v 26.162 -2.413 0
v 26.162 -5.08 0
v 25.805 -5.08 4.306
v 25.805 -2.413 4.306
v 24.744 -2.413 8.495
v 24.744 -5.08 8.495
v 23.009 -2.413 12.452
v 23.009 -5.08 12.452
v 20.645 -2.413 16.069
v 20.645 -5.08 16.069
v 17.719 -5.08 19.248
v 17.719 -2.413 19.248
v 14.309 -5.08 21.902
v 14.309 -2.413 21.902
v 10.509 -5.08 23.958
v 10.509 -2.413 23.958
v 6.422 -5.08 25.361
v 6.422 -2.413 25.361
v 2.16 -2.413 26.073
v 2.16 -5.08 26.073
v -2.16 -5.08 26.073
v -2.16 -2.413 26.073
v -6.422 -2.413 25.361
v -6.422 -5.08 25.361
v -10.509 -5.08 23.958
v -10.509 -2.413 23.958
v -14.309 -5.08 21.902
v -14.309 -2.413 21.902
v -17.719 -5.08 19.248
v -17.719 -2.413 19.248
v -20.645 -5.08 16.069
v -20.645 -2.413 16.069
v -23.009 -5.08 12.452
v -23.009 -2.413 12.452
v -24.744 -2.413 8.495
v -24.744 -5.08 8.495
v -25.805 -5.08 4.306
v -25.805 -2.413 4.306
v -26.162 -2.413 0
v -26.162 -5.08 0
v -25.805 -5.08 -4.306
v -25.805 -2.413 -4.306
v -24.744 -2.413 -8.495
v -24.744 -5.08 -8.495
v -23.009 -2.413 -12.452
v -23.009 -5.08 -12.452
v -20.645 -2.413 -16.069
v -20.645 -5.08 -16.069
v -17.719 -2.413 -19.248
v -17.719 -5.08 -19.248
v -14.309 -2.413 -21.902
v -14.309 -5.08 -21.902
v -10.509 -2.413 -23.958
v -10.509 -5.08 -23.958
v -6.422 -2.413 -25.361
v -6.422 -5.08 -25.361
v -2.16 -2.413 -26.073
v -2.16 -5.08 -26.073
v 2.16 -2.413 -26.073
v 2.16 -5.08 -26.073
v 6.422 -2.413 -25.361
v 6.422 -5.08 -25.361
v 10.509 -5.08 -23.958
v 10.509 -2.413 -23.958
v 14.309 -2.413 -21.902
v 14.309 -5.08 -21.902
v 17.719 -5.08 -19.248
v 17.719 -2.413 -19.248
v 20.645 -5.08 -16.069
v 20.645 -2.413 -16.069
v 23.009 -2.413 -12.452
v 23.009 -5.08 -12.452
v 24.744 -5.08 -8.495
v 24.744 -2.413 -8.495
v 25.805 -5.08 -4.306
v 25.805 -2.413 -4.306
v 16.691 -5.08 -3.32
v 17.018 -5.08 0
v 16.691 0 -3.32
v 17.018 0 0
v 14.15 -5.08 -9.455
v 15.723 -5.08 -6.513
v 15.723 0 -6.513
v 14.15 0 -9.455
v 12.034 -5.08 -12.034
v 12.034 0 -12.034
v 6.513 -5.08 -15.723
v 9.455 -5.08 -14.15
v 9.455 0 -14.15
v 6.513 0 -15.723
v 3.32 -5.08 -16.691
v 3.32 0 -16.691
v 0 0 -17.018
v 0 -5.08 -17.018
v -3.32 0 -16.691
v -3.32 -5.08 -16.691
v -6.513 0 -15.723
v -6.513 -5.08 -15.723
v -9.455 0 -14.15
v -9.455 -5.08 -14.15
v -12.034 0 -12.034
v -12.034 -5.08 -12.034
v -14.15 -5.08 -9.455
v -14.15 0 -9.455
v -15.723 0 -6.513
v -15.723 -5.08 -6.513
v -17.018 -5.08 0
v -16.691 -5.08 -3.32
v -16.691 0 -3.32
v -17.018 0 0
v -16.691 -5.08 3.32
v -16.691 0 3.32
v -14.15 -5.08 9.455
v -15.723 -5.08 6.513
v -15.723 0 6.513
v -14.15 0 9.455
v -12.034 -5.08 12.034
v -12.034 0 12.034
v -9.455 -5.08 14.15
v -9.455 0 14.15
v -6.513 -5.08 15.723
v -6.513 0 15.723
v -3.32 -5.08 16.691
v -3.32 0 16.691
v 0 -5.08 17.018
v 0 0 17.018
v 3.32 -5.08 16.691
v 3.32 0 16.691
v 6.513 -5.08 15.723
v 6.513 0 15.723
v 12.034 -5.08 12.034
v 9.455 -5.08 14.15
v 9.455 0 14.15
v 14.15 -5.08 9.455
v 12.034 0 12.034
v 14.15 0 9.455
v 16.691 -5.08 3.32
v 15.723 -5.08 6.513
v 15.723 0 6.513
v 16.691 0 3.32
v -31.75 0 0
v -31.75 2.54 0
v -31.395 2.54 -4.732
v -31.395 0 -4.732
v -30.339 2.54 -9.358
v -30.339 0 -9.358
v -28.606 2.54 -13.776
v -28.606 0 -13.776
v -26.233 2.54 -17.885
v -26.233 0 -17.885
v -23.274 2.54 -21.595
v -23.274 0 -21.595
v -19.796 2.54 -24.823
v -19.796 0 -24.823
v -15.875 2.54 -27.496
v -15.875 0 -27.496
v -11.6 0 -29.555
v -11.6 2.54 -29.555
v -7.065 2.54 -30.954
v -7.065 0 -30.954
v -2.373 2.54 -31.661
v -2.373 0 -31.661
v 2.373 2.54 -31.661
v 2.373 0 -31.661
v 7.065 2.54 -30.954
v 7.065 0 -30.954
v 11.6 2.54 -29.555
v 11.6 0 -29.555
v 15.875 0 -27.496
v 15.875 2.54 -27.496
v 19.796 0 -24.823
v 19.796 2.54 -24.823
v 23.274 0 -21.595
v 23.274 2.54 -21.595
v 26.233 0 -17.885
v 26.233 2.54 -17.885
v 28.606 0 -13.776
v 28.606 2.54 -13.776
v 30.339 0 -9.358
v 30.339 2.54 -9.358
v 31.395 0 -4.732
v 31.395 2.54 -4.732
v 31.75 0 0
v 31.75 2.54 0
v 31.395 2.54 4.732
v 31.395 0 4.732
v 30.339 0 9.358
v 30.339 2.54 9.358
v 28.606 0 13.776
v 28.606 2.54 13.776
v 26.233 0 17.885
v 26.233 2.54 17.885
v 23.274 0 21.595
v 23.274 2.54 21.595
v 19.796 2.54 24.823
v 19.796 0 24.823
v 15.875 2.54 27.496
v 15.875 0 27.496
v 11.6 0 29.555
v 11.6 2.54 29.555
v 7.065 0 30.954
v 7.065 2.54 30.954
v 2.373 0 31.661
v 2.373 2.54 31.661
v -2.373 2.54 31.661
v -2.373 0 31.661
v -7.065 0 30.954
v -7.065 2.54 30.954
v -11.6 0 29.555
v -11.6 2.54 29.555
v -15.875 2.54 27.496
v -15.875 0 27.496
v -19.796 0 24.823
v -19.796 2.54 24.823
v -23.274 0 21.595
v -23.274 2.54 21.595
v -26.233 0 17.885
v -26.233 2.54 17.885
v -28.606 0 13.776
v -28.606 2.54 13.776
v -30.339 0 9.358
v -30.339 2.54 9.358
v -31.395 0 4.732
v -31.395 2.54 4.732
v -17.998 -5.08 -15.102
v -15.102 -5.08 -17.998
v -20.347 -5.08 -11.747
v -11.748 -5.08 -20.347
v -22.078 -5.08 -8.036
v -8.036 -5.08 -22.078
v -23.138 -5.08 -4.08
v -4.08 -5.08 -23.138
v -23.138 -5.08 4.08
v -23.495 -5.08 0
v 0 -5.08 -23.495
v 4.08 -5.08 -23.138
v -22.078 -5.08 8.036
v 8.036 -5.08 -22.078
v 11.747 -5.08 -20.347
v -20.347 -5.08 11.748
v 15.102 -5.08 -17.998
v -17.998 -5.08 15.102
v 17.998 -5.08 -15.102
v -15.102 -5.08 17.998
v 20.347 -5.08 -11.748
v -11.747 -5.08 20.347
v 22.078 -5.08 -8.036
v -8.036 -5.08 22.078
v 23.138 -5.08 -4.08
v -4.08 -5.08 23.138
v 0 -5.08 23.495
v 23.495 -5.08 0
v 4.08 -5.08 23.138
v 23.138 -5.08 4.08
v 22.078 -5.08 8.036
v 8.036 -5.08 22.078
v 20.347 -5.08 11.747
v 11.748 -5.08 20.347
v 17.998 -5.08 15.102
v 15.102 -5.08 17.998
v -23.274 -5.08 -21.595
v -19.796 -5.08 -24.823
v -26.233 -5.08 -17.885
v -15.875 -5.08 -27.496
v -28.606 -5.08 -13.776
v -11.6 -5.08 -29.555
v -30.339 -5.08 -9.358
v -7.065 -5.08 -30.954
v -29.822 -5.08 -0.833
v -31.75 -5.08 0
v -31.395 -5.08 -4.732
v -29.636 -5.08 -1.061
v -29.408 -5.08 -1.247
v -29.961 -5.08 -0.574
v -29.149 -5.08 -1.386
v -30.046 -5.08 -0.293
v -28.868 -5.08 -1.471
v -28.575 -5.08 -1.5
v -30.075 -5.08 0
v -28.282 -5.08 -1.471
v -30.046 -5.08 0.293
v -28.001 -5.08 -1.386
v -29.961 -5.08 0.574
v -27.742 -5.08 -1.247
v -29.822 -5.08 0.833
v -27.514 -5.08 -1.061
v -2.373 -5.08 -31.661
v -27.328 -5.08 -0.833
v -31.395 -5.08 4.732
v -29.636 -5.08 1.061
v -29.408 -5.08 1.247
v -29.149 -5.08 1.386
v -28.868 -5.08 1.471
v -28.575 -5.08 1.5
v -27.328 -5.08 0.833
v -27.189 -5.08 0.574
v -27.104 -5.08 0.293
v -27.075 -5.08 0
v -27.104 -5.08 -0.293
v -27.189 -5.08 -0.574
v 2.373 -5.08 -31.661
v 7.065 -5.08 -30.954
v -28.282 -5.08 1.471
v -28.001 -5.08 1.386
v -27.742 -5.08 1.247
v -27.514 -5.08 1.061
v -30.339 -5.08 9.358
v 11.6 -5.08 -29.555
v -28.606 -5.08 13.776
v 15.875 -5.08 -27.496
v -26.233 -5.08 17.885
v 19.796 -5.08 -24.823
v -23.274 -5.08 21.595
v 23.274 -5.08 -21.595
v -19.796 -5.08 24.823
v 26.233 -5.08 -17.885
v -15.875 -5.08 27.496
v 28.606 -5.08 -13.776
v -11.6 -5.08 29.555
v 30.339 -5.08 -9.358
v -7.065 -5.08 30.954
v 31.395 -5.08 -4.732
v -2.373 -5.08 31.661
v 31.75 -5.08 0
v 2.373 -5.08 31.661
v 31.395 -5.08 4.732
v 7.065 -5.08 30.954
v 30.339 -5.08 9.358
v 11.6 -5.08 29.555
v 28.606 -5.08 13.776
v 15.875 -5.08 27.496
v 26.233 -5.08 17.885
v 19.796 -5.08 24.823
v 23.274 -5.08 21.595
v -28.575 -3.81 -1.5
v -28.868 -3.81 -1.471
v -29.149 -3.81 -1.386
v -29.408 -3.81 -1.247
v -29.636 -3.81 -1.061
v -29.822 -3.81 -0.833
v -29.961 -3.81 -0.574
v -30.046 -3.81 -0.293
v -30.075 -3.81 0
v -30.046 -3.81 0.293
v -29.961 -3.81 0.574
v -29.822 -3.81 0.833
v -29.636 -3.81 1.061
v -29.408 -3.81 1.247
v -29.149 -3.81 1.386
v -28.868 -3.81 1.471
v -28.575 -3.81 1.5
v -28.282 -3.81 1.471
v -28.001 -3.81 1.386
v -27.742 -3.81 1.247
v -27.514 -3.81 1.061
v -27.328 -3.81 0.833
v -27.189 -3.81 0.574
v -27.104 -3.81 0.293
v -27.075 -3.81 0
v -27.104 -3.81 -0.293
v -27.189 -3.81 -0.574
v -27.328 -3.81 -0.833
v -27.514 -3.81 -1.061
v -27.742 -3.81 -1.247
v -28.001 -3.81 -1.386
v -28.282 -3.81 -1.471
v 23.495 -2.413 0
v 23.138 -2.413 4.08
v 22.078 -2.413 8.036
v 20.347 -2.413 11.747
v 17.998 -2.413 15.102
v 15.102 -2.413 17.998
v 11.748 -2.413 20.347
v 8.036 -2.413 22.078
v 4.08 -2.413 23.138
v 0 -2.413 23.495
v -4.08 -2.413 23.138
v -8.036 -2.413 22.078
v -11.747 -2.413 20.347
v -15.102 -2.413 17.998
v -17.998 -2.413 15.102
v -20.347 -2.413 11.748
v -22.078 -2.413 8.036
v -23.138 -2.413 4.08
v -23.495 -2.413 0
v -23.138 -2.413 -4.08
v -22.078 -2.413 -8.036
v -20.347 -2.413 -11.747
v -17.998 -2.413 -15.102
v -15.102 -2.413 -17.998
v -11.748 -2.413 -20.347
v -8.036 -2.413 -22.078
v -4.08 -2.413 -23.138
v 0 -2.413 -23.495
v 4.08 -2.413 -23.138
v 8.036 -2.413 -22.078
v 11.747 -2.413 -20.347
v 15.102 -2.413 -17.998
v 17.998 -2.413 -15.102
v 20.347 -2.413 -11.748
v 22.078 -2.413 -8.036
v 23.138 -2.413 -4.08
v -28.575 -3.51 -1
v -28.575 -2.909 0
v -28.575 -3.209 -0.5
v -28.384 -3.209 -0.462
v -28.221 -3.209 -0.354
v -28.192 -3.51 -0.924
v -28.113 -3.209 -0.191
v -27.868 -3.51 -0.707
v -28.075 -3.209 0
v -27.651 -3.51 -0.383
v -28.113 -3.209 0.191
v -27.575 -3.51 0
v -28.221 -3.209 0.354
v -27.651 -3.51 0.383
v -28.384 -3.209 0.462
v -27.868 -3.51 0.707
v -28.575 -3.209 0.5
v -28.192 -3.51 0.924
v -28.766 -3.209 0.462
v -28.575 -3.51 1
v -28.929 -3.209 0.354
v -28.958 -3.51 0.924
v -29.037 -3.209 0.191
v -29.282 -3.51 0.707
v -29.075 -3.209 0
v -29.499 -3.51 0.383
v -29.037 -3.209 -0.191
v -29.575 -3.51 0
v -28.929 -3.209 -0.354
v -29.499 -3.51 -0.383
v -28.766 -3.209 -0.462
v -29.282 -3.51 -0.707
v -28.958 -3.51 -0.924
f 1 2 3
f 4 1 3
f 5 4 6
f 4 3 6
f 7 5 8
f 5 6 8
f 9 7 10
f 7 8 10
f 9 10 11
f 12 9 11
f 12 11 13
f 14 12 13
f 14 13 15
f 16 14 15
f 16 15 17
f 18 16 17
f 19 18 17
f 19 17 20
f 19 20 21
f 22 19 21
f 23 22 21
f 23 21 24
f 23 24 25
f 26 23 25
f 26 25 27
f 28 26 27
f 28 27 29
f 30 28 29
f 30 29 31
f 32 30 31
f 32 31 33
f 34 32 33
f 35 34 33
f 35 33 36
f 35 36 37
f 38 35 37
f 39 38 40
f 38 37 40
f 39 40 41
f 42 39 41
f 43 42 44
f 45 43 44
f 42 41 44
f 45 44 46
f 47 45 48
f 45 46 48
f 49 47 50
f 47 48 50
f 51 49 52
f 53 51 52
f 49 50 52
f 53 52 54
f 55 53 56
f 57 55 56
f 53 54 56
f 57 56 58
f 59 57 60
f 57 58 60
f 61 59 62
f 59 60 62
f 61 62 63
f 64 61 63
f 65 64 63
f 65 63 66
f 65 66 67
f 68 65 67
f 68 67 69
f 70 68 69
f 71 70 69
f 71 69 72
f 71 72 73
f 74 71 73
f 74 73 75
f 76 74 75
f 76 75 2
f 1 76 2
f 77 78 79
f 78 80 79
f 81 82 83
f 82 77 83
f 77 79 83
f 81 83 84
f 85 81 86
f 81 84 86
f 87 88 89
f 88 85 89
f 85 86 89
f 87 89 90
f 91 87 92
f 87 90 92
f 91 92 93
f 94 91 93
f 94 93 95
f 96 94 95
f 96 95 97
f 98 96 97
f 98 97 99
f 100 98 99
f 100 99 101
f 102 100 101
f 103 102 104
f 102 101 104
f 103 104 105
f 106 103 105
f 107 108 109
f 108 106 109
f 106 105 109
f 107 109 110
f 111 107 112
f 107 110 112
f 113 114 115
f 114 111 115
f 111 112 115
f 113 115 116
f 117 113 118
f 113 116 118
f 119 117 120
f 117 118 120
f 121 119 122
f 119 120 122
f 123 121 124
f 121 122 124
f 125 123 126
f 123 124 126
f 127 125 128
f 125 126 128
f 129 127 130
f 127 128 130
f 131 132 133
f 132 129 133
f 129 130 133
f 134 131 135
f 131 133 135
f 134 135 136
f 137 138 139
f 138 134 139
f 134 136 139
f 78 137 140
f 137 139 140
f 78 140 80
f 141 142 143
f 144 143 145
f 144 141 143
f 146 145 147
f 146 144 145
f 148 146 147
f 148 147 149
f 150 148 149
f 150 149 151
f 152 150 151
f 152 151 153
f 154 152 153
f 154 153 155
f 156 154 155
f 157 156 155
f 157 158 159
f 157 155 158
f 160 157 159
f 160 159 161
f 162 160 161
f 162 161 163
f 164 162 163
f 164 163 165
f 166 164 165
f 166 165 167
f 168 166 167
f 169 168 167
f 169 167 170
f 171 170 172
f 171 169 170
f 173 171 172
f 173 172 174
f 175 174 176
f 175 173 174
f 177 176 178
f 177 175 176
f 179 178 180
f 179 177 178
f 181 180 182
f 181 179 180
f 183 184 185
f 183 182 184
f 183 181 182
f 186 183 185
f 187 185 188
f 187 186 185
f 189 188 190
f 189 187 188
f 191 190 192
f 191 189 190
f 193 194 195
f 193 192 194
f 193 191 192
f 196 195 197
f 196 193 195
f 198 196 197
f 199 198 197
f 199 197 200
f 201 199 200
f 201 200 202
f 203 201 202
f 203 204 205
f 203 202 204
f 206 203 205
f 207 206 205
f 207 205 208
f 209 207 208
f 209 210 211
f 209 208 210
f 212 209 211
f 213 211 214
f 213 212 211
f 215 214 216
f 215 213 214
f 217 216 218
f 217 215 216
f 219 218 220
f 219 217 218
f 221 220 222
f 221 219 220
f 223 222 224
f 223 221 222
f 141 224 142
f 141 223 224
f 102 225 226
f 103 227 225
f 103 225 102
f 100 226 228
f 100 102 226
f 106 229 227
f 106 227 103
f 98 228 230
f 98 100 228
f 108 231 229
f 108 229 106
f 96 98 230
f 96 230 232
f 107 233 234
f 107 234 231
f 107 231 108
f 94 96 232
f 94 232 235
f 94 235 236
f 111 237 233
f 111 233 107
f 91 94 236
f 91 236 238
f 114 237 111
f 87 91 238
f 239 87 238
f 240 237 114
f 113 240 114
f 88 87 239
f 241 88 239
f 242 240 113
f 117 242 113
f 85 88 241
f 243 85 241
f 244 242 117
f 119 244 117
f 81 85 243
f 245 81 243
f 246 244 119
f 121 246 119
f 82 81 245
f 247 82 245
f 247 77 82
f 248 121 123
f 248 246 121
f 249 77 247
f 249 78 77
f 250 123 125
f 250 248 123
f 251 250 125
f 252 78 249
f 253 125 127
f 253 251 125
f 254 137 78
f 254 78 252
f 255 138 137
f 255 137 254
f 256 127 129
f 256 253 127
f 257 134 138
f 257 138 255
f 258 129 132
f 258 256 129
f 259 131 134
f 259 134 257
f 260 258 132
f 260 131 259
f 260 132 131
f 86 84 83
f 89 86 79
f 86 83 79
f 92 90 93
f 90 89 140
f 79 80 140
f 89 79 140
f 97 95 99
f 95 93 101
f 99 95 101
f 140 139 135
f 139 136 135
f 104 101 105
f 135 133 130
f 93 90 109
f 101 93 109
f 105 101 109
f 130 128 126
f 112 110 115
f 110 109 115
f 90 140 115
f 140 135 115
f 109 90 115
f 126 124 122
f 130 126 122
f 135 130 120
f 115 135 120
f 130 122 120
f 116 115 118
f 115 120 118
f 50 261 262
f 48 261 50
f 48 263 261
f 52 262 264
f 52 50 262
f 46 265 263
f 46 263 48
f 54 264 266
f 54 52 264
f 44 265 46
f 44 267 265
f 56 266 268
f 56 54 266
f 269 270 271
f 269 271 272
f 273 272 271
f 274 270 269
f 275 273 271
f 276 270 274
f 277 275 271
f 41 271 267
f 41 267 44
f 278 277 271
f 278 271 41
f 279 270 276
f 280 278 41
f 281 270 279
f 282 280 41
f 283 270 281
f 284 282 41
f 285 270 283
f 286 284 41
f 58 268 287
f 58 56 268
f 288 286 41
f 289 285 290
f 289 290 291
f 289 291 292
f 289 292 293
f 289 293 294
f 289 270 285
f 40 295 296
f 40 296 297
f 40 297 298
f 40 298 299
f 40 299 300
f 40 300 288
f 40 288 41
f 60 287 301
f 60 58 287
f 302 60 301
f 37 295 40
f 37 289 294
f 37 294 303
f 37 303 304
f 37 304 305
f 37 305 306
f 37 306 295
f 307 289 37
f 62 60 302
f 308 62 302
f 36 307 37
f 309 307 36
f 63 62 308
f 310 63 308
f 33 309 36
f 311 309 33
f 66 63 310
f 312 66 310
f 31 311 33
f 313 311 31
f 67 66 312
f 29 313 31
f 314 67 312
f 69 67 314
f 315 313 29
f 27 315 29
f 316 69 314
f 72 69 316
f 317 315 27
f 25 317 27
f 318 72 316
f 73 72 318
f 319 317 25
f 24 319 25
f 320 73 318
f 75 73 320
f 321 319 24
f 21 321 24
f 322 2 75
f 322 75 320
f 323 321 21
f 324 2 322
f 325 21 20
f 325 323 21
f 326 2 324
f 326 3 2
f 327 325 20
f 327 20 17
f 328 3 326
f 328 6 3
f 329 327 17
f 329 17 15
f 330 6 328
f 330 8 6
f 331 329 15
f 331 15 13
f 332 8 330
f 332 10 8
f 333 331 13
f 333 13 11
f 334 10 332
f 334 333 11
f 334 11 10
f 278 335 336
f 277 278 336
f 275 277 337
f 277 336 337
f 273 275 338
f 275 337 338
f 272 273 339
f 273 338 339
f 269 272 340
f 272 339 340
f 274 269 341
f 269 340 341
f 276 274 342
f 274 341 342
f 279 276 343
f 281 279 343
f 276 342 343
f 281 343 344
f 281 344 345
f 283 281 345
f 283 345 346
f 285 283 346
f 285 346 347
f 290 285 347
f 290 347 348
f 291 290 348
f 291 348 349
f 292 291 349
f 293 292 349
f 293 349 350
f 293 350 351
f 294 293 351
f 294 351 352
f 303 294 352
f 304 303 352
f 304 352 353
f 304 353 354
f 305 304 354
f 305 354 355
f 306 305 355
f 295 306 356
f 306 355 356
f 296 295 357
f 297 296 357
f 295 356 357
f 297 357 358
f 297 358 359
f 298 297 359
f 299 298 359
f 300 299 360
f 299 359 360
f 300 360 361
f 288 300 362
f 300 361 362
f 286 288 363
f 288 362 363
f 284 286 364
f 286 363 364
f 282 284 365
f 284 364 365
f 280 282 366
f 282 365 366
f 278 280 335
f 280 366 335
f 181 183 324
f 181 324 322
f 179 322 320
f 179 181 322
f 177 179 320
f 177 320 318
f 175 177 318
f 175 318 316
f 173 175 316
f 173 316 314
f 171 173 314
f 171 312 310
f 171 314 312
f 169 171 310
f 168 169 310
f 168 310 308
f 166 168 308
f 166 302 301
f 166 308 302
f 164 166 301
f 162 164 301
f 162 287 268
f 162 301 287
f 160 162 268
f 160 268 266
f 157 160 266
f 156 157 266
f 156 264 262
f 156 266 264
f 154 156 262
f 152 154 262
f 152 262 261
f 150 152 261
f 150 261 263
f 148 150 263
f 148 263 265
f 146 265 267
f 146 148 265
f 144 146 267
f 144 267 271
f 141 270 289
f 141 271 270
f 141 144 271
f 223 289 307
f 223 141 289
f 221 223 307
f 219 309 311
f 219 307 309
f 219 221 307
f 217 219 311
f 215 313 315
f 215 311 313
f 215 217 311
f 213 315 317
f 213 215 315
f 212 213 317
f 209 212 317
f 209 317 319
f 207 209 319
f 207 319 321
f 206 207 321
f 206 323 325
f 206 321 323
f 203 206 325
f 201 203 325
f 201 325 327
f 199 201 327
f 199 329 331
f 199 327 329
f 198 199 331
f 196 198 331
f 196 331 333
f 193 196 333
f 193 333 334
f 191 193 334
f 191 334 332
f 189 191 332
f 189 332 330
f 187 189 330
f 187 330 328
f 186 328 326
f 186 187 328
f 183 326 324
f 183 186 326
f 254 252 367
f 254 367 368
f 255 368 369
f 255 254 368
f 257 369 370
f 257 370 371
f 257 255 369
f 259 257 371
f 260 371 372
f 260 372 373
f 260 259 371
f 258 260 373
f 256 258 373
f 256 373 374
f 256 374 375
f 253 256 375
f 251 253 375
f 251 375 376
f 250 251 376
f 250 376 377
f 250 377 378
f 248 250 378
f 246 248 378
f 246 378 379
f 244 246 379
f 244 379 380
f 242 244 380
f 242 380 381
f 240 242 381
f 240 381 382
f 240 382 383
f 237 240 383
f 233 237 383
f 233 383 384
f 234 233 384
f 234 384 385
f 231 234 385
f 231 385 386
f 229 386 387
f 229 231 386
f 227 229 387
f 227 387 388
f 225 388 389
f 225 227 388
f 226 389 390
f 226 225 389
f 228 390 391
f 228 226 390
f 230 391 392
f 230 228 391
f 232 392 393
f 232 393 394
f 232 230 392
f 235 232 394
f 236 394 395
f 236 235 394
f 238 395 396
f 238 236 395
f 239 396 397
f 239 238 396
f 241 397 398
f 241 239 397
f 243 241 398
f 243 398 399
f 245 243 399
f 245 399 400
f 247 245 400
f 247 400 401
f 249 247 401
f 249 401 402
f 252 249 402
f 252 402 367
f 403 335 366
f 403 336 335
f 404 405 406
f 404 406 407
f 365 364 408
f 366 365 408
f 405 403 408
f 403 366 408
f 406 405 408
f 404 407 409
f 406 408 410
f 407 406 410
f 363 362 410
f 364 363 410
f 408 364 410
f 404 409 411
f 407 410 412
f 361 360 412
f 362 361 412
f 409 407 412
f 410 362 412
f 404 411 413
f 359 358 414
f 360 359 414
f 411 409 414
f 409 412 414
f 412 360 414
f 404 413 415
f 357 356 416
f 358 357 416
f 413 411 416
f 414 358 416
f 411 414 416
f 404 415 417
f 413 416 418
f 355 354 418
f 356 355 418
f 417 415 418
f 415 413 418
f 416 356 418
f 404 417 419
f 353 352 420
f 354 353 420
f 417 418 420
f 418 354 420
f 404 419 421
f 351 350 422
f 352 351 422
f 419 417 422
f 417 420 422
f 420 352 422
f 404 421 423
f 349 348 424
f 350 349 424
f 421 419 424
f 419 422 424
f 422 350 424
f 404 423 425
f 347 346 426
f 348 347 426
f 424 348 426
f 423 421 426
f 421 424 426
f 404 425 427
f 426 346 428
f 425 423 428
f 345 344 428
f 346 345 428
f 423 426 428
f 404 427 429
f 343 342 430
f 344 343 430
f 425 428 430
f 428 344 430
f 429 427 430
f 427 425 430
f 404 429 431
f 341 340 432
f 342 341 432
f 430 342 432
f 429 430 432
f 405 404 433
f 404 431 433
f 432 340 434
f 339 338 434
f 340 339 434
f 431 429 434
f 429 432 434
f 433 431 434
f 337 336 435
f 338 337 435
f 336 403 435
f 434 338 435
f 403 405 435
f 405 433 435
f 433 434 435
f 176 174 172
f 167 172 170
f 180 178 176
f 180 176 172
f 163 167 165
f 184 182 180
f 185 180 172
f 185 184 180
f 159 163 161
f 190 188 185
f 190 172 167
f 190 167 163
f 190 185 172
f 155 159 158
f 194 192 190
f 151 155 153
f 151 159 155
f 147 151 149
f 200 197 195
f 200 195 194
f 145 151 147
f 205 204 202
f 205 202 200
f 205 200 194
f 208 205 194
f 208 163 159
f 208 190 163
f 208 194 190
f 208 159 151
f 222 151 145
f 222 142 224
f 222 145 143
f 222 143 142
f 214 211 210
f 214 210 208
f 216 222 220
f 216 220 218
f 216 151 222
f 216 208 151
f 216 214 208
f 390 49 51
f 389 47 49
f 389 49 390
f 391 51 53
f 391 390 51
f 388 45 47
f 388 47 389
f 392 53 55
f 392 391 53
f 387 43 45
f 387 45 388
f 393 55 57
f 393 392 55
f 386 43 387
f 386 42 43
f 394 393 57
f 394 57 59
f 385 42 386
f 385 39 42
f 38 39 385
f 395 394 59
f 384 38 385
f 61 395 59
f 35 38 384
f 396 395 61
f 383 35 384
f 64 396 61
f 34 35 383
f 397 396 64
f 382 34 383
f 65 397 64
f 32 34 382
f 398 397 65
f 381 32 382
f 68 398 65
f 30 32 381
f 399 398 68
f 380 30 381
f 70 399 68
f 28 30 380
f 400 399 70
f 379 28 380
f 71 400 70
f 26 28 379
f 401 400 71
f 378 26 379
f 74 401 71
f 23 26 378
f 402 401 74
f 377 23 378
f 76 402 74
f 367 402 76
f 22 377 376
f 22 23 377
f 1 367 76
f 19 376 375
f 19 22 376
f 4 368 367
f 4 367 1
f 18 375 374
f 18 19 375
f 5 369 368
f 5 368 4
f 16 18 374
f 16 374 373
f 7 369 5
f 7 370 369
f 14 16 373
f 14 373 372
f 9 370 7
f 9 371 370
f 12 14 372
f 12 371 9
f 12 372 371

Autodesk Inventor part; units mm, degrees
ref_plane "YZ Plane" through (0, 0, 0) normal (1, 0, 0) x (0, 1, 0)
ref_plane "XZ Plane" through (0, 0, 0) normal (0, 1, 0) x (-1, 0, 0)
ref_plane "XY Plane" through (0, 0, 0) normal (0, 0, 1) x (1, 0, 0)
sketch "Sketch1" plane through (0, 0, 0) normal (0, 1, 0) x (-1, 0, 0)
  circle A0 centre (0, 0) radius 31.75
  dimension "d0" = 63.5
extrude "Extrusion1" add sketch "Sketch1" along normal blind 2.54
sketch "Sketch2" plane through (0, 0, 0) normal (0, -1, 0) x (1, 0, 0)
  circle A0 centre (0, 0) radius 31.75 projected
  circle A1 centre (0, 0) radius 17.018
  circle A2 centre (0, 0) radius 31.75
  dimension "d4" = 34.036
extrude "Extrusion2" add sketch "Sketch2" along normal blind 5.08
sketch "Sketch3" plane through (0, -5.08, 0) normal (0, -1, 0) x (1, 0, 0)
  circle A0 centre (0, 0) radius 23.495
  circle A1 centre (0, 0) radius 17.018 projected
  circle A2 centre (0, 0) radius 26.162
  dimension "d7" = 46.99
  dimension "d8" = 52.324
extrude "Extrusion3" cut sketch "Sketch3" against normal blind 2.667 contours A2
sketch "Sketch5" plane through (0, -5.08, 0) normal (0, -1, 0) x (1, 0, 0)
  point P0 (0, 0)
  point P1 (-28.575, 0)
  dimension "d18" = 28.575
hole "Hole1" at (-28.575, -5.08, 0) direction (0, 1, 0) diameter 3 depth 1.27 tip angle 118
properties part number "LED housing the one we're using"
